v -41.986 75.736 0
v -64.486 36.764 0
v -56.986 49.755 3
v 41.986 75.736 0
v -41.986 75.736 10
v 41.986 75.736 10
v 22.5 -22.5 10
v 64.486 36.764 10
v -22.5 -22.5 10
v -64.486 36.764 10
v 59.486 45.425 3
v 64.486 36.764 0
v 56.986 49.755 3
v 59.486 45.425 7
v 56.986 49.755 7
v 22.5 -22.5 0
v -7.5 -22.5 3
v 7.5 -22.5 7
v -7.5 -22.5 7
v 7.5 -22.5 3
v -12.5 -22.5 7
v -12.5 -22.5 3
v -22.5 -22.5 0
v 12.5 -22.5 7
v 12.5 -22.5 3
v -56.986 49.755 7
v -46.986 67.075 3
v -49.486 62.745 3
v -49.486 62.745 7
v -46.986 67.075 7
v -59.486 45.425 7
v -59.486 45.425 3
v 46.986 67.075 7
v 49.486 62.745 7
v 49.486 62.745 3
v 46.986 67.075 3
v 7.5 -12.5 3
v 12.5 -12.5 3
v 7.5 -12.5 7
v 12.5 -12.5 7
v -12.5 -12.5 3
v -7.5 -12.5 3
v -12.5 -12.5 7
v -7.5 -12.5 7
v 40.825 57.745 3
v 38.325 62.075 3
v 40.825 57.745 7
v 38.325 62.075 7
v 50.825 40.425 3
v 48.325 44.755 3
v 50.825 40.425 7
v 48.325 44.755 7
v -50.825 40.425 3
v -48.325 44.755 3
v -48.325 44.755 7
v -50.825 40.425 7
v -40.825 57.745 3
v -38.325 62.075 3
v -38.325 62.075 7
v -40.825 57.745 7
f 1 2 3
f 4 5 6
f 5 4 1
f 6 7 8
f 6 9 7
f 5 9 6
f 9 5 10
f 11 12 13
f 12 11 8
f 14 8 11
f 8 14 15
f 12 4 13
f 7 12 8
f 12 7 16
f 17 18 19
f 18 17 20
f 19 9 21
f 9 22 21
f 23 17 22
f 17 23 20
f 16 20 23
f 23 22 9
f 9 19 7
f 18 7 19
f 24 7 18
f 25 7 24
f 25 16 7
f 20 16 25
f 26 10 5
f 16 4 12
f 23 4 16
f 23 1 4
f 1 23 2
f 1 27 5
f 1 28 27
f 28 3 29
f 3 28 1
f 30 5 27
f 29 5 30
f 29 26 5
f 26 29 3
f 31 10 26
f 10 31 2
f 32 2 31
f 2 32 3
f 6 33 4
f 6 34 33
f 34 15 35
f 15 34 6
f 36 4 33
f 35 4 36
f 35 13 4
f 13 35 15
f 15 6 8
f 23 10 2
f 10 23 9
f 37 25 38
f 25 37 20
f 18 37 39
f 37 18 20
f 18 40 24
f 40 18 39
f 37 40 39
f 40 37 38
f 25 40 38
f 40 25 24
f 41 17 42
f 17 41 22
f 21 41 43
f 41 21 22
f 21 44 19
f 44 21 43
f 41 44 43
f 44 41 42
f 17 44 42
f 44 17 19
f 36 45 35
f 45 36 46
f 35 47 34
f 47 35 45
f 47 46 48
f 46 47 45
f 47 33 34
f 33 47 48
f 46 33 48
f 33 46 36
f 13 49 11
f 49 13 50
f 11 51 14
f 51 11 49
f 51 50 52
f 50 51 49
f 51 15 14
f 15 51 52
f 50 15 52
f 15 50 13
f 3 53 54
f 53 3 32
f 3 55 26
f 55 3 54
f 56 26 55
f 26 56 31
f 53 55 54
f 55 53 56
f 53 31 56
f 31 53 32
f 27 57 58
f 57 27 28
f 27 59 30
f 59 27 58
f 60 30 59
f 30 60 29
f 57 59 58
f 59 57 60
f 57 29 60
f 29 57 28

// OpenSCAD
module mount(s_xy=45, t_x=45, s_z=1, h_x=3, h_y=12, h_z=12) {
    difference() {
        linear_extrude(s_z) {
            square(size = s_xy, center = true);
        }
    
        translate_x = 10;
        translate_y = -(s_xy * .5);
        translate_z = (s_z / 2) - (h_z / 2);
        
        translate([translate_x, translate_y, translate_z]) 
            linear_extrude(h_z) {
                square(size=[h_x, h_y], center=true);
            }
            
        translate([-translate_x, translate_y, translate_z])
            linear_extrude(h_z) {
                square(size=[h_x, h_y], center=true);
            }

    }
}

square_xy =  45;
square_z = 10;

translate_x = square_xy * .75;
translate_y = square_xy;

degrees = 120;

hole_x = 5;
hole_y = 20;
hole_z = 4;

hole_translate_x = 10;
hole_translate_y = -(square_xy * .5);
hole_translate_z = (square_z / 2) - (hole_z / 2);



difference() {
    
    hull() {
        mount(square_xy, translate_x, square_z, hole_x, hole_y, hole_z);

        translate([translate_x, translate_y, 0])
            rotate(120)
                mount(square_xy, translate_x, square_z, hole_x, hole_y, hole_z);
            
        translate([-translate_x, translate_y, 0])
            rotate(-120)
                mount(square_xy, translate_x, square_z, hole_x, hole_y, hole_z);
    }

   
    translate([hole_translate_x, hole_translate_y, hole_translate_z]) 
        linear_extrude(hole_z) {
            square(size=[hole_x, hole_y], center=true);
        }
        
    translate([-hole_translate_x, hole_translate_y, hole_translate_z])
        linear_extrude(hole_z) {
            square(size=[hole_x, hole_y], center=true);
        }
        
    translate([translate_x, translate_y, 0])
        rotate(120)
            translate([hole_translate_x, hole_translate_y, hole_translate_z]) 
                linear_extrude(hole_z) {
                    square(size=[hole_x, hole_y], center=true);
                }
                
    translate([translate_x, translate_y, 0])
        rotate(120)
            translate([-hole_translate_x, hole_translate_y, hole_translate_z]) 
                linear_extrude(hole_z) {
                    square(size=[hole_x, hole_y], center=true);
                }
                
    translate([-translate_x, translate_y, 0])
        rotate(-120)
            translate([hole_translate_x, hole_translate_y, hole_translate_z]) 
                linear_extrude(hole_z) {
                    square(size=[hole_x, hole_y], center=true);
                }
                
    translate([-translate_x, translate_y, 0])
        rotate(-120)
            translate([-hole_translate_x, hole_translate_y, hole_translate_z]) 
                linear_extrude(hole_z) {
                    square(size=[hole_x, hole_y], center=true);
                }       
}        
